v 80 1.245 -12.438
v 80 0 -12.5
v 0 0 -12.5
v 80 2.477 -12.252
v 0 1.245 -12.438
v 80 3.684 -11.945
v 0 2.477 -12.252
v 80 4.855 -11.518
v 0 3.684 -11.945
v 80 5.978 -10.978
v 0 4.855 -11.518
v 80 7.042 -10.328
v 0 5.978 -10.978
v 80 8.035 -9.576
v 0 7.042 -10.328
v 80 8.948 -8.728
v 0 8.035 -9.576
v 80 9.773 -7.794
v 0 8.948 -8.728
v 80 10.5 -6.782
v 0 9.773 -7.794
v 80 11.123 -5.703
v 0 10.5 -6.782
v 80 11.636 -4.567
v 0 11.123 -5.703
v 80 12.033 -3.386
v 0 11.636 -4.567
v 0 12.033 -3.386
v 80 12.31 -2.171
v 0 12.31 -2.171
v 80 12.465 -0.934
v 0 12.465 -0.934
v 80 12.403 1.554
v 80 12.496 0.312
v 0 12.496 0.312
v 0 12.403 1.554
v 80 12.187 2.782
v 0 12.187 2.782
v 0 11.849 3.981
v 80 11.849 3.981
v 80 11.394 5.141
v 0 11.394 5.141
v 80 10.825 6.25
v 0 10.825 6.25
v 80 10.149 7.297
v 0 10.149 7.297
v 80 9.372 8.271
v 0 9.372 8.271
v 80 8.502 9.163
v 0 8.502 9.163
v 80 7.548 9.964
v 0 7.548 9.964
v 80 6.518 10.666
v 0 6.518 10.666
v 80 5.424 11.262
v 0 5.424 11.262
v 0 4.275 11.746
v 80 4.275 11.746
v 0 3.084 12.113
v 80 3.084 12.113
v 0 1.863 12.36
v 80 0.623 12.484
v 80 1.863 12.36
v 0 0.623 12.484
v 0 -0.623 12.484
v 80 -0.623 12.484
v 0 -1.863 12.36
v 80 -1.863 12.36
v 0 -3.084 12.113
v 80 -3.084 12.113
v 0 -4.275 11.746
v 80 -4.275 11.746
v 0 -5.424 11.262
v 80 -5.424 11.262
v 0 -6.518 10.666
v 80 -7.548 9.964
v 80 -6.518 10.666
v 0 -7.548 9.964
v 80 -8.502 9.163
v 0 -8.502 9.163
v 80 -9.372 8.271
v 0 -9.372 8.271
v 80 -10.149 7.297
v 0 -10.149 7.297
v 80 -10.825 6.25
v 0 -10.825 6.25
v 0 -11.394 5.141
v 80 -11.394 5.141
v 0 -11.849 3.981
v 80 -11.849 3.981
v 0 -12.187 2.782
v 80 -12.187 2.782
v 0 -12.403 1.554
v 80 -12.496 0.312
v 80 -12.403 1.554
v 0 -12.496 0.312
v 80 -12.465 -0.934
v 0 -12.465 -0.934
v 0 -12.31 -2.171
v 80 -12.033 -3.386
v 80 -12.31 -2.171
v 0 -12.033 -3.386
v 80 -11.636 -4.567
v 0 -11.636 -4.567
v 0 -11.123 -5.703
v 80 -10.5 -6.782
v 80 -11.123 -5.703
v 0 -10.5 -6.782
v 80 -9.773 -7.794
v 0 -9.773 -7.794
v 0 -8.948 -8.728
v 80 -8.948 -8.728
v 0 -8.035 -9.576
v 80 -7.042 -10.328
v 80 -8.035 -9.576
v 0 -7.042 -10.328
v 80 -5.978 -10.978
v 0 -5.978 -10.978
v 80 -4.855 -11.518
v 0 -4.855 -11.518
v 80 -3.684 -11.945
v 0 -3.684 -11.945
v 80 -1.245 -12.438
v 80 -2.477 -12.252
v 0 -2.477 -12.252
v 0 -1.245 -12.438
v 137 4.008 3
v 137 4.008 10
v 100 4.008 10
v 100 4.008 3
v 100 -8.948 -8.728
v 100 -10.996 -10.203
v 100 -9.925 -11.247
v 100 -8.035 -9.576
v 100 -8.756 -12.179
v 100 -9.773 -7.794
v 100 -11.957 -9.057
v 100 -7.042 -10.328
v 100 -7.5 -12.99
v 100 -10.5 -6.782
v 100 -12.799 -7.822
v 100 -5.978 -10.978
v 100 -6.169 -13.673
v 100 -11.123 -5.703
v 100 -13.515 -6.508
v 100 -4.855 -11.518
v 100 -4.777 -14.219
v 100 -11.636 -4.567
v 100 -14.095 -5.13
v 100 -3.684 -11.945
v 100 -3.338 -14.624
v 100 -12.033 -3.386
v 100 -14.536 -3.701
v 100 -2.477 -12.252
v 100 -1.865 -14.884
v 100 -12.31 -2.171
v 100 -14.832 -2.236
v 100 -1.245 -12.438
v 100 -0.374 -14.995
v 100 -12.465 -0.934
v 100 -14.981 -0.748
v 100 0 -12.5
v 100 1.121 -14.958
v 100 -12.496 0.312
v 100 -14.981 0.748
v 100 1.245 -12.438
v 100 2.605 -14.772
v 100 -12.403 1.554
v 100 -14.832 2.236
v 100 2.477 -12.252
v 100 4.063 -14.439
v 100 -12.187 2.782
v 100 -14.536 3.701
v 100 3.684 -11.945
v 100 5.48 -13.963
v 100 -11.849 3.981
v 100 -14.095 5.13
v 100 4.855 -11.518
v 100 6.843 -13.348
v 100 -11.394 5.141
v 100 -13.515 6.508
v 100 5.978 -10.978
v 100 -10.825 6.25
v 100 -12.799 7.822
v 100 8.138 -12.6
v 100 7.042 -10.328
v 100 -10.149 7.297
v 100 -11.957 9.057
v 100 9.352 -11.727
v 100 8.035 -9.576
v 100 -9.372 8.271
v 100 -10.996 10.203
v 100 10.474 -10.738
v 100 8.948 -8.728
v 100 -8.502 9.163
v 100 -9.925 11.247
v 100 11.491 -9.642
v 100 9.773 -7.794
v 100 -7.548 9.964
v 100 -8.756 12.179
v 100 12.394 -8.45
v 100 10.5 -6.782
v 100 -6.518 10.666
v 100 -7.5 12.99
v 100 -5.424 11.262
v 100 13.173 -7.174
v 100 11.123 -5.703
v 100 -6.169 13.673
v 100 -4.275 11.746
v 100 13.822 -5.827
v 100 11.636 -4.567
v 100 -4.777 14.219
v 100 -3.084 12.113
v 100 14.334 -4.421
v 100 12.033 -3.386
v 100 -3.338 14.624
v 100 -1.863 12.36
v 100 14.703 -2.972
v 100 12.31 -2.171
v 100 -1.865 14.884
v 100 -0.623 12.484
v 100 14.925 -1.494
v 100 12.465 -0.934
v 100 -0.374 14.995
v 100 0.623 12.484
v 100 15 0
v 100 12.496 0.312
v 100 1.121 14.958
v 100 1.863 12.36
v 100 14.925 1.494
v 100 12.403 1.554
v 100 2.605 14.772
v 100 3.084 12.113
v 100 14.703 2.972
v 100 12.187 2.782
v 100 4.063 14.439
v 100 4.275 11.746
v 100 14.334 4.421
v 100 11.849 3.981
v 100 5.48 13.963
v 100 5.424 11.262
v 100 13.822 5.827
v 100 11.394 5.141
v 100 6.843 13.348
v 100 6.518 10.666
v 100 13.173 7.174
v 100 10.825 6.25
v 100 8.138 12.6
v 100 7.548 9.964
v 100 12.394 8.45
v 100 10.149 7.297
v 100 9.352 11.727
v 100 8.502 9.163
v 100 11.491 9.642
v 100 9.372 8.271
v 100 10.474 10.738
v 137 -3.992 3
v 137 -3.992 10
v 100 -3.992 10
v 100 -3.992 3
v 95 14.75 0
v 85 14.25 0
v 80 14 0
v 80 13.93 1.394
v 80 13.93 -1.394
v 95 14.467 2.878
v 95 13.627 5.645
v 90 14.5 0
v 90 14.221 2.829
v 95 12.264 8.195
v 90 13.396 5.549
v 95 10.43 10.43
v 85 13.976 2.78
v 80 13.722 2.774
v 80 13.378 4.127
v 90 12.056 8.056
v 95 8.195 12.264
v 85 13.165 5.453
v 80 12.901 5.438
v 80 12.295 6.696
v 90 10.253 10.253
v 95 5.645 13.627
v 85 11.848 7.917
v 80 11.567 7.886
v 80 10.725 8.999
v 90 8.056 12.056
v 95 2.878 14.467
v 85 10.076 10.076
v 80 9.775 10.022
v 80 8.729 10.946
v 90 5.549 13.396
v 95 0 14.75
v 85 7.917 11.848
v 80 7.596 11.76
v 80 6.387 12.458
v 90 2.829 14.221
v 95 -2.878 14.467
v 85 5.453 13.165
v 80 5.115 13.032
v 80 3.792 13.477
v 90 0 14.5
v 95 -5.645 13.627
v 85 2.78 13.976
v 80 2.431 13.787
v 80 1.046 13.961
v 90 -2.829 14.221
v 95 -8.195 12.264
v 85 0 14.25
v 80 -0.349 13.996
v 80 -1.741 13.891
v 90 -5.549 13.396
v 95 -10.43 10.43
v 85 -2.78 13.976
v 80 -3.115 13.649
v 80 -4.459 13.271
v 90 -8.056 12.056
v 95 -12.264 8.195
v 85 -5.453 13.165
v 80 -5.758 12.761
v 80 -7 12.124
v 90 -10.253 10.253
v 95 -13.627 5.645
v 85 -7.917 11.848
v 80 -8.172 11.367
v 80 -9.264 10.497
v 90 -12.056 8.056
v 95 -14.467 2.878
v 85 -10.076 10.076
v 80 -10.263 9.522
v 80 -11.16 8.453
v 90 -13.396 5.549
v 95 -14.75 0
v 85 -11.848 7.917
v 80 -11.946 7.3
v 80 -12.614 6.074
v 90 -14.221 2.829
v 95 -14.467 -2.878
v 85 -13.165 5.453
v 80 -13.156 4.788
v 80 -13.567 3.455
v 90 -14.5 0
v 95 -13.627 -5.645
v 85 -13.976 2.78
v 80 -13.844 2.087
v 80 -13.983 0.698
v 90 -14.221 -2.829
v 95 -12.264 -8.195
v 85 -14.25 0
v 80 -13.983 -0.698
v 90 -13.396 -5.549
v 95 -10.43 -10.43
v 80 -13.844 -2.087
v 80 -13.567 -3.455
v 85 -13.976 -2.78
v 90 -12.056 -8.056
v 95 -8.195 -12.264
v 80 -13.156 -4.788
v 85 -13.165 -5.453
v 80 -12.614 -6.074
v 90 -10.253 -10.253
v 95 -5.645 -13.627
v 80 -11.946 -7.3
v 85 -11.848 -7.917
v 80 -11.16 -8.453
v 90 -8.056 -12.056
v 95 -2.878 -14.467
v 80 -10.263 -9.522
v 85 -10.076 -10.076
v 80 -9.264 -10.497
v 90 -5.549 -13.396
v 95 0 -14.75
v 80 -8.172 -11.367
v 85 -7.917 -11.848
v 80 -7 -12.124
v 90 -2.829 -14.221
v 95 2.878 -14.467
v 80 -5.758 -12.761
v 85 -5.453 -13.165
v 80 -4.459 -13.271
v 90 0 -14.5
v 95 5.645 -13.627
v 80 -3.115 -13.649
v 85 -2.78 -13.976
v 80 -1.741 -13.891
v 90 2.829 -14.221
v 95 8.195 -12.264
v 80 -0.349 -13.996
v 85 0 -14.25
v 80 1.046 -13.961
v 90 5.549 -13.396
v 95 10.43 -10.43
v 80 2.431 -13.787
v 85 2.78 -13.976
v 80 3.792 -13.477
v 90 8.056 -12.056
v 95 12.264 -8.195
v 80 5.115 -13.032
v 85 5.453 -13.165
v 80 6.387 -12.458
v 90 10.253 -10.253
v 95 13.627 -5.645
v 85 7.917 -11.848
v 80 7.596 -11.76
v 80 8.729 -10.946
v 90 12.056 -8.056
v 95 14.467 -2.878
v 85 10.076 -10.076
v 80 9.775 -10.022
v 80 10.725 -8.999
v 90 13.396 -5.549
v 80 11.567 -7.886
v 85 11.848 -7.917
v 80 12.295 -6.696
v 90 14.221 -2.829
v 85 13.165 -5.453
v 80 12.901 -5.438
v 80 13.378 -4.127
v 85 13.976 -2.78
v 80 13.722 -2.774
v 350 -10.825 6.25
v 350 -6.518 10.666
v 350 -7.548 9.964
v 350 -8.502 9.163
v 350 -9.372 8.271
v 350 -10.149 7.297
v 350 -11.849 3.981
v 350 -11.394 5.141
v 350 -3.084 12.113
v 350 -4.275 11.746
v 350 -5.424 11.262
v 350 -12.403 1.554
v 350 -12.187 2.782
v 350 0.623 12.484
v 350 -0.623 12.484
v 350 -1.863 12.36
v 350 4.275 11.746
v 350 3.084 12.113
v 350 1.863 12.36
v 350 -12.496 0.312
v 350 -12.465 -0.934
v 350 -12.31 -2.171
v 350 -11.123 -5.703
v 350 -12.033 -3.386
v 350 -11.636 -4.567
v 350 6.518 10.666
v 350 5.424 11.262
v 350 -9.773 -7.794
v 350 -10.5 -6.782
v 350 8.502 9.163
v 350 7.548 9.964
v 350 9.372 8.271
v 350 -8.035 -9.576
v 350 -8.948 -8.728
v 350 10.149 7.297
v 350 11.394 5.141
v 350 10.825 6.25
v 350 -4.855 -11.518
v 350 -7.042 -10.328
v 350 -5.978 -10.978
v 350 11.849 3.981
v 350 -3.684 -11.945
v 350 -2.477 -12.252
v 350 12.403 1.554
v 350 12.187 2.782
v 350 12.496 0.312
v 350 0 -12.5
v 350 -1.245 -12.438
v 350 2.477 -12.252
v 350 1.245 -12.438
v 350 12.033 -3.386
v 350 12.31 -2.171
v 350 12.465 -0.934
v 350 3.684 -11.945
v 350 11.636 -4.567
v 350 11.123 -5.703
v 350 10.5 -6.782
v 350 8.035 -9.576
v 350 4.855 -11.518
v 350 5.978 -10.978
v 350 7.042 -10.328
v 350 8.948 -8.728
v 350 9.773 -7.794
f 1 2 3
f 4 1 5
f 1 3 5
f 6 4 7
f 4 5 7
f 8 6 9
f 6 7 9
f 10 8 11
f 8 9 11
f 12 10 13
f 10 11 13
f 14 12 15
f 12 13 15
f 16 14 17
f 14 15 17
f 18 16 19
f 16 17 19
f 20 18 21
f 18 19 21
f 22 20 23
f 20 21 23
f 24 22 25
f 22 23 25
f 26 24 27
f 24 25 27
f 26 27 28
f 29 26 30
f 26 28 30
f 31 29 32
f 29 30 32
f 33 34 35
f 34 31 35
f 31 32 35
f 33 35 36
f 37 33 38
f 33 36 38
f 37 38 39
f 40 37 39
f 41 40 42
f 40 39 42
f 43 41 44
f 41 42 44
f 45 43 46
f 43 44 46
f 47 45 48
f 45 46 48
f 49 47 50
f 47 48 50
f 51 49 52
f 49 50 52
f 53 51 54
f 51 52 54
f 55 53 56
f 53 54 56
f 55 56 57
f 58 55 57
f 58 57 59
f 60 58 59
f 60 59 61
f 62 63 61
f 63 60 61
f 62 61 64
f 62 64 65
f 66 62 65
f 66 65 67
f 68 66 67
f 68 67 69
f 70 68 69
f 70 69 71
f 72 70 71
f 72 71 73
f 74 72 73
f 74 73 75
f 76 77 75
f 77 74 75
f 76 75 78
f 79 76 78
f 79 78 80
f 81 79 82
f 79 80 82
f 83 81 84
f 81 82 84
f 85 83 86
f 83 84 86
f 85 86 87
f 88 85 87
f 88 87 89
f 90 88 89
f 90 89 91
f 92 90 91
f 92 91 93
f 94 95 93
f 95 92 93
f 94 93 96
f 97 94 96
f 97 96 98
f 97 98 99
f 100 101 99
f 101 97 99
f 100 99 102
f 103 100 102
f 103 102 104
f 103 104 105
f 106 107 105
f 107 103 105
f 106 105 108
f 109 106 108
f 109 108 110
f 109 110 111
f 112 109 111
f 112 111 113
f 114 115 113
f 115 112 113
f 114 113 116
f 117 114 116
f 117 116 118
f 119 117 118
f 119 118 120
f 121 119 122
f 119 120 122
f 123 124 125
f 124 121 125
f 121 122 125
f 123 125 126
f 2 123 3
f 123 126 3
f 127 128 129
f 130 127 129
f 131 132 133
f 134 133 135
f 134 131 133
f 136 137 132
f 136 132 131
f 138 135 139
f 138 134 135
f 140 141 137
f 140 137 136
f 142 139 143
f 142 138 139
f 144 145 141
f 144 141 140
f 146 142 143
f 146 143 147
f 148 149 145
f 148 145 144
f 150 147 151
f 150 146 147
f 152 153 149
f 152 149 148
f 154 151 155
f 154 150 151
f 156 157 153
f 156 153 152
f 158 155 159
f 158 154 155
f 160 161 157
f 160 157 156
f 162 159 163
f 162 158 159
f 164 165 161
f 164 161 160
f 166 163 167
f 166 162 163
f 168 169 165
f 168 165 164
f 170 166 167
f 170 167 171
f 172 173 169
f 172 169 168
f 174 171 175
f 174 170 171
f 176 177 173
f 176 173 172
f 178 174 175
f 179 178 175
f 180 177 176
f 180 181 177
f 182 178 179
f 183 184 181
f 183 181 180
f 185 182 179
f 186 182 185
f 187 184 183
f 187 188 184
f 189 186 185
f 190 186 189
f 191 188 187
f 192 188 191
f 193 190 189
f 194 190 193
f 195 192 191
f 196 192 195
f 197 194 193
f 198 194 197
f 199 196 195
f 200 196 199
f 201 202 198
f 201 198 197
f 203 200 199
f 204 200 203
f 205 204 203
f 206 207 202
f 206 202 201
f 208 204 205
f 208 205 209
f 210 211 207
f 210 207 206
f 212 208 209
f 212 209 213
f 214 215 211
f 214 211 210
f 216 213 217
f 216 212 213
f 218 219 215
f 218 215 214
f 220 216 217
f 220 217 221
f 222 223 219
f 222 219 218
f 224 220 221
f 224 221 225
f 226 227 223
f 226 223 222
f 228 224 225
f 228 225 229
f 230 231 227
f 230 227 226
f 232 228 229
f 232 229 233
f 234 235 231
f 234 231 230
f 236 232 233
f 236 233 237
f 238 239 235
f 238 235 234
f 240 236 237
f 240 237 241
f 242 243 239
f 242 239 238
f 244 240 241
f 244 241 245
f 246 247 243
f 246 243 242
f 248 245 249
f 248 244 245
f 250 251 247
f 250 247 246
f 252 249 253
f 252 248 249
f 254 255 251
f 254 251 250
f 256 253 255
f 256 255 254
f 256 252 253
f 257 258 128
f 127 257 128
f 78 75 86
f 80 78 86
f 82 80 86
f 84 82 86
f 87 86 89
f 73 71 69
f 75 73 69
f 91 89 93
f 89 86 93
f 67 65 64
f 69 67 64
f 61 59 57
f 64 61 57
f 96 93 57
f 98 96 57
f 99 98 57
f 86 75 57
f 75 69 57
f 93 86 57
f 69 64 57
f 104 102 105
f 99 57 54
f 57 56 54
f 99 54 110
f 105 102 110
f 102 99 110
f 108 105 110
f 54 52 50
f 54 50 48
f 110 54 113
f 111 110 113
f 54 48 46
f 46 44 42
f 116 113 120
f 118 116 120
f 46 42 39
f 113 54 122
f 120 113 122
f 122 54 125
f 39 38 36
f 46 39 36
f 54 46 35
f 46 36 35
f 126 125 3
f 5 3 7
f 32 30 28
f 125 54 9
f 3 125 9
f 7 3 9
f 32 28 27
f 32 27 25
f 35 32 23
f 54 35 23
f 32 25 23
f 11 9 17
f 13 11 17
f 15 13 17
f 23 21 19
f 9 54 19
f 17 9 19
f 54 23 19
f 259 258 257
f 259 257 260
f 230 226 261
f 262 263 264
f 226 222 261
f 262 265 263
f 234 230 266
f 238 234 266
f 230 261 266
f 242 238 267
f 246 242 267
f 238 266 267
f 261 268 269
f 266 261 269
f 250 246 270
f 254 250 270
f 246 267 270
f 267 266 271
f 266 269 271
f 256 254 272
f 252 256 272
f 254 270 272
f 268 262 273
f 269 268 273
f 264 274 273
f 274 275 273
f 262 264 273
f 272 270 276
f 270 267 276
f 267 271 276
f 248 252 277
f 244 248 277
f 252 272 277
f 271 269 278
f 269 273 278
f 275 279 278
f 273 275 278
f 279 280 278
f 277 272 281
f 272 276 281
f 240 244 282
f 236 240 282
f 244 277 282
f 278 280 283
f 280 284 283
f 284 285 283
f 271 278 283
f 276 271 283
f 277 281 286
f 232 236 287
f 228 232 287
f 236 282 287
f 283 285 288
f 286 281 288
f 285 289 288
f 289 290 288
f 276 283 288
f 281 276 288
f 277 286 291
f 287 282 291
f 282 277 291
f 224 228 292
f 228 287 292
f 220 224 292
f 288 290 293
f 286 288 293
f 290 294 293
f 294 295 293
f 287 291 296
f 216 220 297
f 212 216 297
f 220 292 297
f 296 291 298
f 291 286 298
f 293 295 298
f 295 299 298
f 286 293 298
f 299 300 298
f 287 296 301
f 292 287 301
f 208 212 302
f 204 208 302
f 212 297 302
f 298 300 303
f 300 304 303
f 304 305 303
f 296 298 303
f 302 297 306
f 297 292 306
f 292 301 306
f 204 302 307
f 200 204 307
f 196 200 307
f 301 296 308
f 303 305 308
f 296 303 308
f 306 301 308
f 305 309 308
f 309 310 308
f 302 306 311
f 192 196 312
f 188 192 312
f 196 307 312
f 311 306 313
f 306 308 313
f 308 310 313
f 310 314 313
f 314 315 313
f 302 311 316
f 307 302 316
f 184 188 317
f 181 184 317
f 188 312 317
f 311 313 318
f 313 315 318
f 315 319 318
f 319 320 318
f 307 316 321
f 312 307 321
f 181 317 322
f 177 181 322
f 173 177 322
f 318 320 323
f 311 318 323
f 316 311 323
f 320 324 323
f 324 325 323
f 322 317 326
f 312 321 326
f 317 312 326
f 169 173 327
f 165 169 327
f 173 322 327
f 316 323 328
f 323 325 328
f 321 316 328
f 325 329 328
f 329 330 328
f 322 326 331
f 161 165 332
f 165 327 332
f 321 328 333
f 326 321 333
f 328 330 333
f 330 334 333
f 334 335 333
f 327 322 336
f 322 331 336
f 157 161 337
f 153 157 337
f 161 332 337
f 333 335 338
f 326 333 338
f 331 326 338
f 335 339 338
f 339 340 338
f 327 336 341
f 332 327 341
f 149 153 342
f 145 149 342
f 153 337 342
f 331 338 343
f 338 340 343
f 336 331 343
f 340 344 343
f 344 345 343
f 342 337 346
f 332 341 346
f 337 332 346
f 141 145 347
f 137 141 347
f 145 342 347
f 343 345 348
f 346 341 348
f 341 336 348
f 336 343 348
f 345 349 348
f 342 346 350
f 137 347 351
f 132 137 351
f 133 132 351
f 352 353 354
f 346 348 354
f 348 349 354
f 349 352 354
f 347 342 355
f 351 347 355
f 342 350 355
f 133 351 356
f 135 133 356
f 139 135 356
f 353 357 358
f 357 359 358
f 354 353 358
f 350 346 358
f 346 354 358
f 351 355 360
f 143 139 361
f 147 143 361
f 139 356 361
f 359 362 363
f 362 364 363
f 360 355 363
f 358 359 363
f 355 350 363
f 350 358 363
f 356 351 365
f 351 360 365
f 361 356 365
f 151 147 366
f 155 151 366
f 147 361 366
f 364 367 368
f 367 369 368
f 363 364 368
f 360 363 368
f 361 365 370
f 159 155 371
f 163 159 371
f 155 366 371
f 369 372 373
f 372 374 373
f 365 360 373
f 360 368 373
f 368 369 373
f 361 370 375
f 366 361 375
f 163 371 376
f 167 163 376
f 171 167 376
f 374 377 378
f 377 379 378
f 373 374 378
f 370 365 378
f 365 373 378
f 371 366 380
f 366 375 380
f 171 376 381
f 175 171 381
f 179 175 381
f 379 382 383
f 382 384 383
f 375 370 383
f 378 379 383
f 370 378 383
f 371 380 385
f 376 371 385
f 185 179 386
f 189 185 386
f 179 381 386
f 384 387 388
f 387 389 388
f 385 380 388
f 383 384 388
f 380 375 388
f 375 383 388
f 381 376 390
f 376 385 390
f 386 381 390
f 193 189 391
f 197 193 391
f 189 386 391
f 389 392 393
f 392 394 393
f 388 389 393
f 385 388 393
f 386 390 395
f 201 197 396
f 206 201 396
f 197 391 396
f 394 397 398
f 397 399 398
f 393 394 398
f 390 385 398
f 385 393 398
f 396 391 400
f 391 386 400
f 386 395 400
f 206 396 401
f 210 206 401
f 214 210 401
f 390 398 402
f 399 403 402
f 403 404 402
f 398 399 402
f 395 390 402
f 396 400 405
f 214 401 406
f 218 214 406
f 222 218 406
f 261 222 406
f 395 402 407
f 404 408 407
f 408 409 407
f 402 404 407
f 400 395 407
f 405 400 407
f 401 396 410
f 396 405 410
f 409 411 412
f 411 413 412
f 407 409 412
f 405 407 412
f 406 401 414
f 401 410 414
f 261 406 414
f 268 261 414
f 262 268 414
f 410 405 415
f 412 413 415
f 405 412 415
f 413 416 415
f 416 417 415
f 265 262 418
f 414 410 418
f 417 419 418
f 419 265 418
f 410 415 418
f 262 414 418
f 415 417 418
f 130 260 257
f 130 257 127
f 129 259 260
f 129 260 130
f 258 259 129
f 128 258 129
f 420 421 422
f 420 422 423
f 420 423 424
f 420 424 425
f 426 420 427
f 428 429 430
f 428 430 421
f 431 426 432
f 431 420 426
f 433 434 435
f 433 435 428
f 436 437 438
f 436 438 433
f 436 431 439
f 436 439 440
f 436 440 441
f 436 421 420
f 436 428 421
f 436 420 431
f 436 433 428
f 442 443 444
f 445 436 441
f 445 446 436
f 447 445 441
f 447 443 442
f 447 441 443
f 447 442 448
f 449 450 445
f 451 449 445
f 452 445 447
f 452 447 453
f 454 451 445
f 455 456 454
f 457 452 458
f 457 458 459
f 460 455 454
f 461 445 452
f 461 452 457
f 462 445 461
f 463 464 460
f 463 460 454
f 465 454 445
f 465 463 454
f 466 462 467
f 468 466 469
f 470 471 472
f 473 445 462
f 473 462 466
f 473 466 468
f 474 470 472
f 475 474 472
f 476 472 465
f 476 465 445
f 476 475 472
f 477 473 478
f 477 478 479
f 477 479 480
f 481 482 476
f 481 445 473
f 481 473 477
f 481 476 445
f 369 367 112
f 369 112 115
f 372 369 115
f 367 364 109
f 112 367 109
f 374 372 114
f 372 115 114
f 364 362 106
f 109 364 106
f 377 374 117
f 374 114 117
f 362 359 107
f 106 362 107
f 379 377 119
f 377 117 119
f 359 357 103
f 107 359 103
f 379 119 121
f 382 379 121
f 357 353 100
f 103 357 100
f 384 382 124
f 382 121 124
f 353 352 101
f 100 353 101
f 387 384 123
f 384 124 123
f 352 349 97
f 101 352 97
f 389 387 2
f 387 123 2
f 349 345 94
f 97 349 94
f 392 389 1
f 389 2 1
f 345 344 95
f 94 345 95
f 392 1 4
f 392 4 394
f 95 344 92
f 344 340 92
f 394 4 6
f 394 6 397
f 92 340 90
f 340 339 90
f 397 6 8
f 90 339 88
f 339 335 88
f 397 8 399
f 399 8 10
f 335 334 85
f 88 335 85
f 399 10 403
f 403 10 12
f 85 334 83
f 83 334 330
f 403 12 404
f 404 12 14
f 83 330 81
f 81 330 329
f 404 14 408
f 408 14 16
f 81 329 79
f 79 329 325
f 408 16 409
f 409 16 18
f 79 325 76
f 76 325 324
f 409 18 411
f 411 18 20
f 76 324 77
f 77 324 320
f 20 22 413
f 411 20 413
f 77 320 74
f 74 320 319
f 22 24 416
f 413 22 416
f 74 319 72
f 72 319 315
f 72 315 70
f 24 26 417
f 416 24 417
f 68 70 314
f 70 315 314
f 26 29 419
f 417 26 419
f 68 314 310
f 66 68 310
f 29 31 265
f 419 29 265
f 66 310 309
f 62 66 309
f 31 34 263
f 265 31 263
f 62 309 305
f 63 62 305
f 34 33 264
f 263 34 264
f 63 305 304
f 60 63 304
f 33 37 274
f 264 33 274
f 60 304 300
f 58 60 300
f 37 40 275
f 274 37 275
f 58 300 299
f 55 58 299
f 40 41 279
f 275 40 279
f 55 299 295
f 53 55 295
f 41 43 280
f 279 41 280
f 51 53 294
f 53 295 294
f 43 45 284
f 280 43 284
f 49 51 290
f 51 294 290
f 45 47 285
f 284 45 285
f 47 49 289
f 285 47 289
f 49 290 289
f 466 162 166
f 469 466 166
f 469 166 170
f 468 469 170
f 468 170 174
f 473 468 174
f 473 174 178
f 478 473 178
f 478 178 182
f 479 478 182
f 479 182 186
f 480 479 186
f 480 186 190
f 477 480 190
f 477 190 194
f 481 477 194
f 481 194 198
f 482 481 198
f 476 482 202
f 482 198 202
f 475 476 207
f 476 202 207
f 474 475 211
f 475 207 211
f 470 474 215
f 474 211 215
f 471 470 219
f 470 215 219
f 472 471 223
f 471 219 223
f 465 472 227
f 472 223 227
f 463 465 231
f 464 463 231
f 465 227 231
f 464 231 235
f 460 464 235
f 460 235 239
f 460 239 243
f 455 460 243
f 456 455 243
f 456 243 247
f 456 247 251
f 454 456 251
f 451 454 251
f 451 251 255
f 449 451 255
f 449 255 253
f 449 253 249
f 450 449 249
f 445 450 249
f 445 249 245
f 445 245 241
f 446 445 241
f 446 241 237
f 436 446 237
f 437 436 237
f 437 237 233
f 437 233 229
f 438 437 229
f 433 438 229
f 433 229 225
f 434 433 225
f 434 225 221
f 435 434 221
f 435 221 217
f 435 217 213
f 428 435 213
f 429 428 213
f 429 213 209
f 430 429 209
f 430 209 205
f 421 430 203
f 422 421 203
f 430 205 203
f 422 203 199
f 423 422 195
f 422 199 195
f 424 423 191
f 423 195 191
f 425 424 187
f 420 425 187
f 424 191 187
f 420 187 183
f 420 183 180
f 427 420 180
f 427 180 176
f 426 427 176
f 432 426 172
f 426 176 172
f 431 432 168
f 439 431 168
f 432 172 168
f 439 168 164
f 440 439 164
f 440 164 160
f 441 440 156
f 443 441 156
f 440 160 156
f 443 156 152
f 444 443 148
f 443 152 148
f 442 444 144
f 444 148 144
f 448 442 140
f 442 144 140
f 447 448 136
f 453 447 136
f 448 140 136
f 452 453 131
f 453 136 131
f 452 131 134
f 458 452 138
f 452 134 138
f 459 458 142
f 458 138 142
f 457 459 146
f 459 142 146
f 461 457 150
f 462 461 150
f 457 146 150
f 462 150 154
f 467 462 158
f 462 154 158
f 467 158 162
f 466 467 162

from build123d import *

# Parameters (mm, degrees)
SKETCH1_R           = 12.5
BOSS_EXTRUDE1_DEPTH = 350
SKETCH3_R           = 15
SKETCH2_R           = 14
SKETCH4_W           = 8
SKETCH4_H           = 37
CUT_EXTRUDE2_DEPTH  = 7


with BuildPart() as part:
    # Sketch1 → Boss-Extrude1 (new body)
    with BuildSketch(Plane.YZ):
        with Locations(Location((0, 0, 0), (0, 0, 270))):
            Circle(SKETCH1_R)
    extrude(amount=BOSS_EXTRUDE1_DEPTH)

    # Sketch3 → Loft1 section 0
    with BuildSketch(Plane.YZ.offset(100)):
        Circle(SKETCH3_R)
    # Sketch2 → Loft1 section 1
    with BuildSketch(Plane.YZ.offset(80)):
        Circle(SKETCH2_R)
    loft()

    # Sketch4 → Cut-Extrude2 (cut)
    with BuildSketch(Plane(origin=(0, 0, 10), x_dir=(0, 1, 0), z_dir=(0, 0, 1))):
        with Locations((0.007753839, -118.5)):
            Rectangle(SKETCH4_W, SKETCH4_H)
    extrude(amount=-CUT_EXTRUDE2_DEPTH, mode=Mode.SUBTRACT)


solid = part.part
